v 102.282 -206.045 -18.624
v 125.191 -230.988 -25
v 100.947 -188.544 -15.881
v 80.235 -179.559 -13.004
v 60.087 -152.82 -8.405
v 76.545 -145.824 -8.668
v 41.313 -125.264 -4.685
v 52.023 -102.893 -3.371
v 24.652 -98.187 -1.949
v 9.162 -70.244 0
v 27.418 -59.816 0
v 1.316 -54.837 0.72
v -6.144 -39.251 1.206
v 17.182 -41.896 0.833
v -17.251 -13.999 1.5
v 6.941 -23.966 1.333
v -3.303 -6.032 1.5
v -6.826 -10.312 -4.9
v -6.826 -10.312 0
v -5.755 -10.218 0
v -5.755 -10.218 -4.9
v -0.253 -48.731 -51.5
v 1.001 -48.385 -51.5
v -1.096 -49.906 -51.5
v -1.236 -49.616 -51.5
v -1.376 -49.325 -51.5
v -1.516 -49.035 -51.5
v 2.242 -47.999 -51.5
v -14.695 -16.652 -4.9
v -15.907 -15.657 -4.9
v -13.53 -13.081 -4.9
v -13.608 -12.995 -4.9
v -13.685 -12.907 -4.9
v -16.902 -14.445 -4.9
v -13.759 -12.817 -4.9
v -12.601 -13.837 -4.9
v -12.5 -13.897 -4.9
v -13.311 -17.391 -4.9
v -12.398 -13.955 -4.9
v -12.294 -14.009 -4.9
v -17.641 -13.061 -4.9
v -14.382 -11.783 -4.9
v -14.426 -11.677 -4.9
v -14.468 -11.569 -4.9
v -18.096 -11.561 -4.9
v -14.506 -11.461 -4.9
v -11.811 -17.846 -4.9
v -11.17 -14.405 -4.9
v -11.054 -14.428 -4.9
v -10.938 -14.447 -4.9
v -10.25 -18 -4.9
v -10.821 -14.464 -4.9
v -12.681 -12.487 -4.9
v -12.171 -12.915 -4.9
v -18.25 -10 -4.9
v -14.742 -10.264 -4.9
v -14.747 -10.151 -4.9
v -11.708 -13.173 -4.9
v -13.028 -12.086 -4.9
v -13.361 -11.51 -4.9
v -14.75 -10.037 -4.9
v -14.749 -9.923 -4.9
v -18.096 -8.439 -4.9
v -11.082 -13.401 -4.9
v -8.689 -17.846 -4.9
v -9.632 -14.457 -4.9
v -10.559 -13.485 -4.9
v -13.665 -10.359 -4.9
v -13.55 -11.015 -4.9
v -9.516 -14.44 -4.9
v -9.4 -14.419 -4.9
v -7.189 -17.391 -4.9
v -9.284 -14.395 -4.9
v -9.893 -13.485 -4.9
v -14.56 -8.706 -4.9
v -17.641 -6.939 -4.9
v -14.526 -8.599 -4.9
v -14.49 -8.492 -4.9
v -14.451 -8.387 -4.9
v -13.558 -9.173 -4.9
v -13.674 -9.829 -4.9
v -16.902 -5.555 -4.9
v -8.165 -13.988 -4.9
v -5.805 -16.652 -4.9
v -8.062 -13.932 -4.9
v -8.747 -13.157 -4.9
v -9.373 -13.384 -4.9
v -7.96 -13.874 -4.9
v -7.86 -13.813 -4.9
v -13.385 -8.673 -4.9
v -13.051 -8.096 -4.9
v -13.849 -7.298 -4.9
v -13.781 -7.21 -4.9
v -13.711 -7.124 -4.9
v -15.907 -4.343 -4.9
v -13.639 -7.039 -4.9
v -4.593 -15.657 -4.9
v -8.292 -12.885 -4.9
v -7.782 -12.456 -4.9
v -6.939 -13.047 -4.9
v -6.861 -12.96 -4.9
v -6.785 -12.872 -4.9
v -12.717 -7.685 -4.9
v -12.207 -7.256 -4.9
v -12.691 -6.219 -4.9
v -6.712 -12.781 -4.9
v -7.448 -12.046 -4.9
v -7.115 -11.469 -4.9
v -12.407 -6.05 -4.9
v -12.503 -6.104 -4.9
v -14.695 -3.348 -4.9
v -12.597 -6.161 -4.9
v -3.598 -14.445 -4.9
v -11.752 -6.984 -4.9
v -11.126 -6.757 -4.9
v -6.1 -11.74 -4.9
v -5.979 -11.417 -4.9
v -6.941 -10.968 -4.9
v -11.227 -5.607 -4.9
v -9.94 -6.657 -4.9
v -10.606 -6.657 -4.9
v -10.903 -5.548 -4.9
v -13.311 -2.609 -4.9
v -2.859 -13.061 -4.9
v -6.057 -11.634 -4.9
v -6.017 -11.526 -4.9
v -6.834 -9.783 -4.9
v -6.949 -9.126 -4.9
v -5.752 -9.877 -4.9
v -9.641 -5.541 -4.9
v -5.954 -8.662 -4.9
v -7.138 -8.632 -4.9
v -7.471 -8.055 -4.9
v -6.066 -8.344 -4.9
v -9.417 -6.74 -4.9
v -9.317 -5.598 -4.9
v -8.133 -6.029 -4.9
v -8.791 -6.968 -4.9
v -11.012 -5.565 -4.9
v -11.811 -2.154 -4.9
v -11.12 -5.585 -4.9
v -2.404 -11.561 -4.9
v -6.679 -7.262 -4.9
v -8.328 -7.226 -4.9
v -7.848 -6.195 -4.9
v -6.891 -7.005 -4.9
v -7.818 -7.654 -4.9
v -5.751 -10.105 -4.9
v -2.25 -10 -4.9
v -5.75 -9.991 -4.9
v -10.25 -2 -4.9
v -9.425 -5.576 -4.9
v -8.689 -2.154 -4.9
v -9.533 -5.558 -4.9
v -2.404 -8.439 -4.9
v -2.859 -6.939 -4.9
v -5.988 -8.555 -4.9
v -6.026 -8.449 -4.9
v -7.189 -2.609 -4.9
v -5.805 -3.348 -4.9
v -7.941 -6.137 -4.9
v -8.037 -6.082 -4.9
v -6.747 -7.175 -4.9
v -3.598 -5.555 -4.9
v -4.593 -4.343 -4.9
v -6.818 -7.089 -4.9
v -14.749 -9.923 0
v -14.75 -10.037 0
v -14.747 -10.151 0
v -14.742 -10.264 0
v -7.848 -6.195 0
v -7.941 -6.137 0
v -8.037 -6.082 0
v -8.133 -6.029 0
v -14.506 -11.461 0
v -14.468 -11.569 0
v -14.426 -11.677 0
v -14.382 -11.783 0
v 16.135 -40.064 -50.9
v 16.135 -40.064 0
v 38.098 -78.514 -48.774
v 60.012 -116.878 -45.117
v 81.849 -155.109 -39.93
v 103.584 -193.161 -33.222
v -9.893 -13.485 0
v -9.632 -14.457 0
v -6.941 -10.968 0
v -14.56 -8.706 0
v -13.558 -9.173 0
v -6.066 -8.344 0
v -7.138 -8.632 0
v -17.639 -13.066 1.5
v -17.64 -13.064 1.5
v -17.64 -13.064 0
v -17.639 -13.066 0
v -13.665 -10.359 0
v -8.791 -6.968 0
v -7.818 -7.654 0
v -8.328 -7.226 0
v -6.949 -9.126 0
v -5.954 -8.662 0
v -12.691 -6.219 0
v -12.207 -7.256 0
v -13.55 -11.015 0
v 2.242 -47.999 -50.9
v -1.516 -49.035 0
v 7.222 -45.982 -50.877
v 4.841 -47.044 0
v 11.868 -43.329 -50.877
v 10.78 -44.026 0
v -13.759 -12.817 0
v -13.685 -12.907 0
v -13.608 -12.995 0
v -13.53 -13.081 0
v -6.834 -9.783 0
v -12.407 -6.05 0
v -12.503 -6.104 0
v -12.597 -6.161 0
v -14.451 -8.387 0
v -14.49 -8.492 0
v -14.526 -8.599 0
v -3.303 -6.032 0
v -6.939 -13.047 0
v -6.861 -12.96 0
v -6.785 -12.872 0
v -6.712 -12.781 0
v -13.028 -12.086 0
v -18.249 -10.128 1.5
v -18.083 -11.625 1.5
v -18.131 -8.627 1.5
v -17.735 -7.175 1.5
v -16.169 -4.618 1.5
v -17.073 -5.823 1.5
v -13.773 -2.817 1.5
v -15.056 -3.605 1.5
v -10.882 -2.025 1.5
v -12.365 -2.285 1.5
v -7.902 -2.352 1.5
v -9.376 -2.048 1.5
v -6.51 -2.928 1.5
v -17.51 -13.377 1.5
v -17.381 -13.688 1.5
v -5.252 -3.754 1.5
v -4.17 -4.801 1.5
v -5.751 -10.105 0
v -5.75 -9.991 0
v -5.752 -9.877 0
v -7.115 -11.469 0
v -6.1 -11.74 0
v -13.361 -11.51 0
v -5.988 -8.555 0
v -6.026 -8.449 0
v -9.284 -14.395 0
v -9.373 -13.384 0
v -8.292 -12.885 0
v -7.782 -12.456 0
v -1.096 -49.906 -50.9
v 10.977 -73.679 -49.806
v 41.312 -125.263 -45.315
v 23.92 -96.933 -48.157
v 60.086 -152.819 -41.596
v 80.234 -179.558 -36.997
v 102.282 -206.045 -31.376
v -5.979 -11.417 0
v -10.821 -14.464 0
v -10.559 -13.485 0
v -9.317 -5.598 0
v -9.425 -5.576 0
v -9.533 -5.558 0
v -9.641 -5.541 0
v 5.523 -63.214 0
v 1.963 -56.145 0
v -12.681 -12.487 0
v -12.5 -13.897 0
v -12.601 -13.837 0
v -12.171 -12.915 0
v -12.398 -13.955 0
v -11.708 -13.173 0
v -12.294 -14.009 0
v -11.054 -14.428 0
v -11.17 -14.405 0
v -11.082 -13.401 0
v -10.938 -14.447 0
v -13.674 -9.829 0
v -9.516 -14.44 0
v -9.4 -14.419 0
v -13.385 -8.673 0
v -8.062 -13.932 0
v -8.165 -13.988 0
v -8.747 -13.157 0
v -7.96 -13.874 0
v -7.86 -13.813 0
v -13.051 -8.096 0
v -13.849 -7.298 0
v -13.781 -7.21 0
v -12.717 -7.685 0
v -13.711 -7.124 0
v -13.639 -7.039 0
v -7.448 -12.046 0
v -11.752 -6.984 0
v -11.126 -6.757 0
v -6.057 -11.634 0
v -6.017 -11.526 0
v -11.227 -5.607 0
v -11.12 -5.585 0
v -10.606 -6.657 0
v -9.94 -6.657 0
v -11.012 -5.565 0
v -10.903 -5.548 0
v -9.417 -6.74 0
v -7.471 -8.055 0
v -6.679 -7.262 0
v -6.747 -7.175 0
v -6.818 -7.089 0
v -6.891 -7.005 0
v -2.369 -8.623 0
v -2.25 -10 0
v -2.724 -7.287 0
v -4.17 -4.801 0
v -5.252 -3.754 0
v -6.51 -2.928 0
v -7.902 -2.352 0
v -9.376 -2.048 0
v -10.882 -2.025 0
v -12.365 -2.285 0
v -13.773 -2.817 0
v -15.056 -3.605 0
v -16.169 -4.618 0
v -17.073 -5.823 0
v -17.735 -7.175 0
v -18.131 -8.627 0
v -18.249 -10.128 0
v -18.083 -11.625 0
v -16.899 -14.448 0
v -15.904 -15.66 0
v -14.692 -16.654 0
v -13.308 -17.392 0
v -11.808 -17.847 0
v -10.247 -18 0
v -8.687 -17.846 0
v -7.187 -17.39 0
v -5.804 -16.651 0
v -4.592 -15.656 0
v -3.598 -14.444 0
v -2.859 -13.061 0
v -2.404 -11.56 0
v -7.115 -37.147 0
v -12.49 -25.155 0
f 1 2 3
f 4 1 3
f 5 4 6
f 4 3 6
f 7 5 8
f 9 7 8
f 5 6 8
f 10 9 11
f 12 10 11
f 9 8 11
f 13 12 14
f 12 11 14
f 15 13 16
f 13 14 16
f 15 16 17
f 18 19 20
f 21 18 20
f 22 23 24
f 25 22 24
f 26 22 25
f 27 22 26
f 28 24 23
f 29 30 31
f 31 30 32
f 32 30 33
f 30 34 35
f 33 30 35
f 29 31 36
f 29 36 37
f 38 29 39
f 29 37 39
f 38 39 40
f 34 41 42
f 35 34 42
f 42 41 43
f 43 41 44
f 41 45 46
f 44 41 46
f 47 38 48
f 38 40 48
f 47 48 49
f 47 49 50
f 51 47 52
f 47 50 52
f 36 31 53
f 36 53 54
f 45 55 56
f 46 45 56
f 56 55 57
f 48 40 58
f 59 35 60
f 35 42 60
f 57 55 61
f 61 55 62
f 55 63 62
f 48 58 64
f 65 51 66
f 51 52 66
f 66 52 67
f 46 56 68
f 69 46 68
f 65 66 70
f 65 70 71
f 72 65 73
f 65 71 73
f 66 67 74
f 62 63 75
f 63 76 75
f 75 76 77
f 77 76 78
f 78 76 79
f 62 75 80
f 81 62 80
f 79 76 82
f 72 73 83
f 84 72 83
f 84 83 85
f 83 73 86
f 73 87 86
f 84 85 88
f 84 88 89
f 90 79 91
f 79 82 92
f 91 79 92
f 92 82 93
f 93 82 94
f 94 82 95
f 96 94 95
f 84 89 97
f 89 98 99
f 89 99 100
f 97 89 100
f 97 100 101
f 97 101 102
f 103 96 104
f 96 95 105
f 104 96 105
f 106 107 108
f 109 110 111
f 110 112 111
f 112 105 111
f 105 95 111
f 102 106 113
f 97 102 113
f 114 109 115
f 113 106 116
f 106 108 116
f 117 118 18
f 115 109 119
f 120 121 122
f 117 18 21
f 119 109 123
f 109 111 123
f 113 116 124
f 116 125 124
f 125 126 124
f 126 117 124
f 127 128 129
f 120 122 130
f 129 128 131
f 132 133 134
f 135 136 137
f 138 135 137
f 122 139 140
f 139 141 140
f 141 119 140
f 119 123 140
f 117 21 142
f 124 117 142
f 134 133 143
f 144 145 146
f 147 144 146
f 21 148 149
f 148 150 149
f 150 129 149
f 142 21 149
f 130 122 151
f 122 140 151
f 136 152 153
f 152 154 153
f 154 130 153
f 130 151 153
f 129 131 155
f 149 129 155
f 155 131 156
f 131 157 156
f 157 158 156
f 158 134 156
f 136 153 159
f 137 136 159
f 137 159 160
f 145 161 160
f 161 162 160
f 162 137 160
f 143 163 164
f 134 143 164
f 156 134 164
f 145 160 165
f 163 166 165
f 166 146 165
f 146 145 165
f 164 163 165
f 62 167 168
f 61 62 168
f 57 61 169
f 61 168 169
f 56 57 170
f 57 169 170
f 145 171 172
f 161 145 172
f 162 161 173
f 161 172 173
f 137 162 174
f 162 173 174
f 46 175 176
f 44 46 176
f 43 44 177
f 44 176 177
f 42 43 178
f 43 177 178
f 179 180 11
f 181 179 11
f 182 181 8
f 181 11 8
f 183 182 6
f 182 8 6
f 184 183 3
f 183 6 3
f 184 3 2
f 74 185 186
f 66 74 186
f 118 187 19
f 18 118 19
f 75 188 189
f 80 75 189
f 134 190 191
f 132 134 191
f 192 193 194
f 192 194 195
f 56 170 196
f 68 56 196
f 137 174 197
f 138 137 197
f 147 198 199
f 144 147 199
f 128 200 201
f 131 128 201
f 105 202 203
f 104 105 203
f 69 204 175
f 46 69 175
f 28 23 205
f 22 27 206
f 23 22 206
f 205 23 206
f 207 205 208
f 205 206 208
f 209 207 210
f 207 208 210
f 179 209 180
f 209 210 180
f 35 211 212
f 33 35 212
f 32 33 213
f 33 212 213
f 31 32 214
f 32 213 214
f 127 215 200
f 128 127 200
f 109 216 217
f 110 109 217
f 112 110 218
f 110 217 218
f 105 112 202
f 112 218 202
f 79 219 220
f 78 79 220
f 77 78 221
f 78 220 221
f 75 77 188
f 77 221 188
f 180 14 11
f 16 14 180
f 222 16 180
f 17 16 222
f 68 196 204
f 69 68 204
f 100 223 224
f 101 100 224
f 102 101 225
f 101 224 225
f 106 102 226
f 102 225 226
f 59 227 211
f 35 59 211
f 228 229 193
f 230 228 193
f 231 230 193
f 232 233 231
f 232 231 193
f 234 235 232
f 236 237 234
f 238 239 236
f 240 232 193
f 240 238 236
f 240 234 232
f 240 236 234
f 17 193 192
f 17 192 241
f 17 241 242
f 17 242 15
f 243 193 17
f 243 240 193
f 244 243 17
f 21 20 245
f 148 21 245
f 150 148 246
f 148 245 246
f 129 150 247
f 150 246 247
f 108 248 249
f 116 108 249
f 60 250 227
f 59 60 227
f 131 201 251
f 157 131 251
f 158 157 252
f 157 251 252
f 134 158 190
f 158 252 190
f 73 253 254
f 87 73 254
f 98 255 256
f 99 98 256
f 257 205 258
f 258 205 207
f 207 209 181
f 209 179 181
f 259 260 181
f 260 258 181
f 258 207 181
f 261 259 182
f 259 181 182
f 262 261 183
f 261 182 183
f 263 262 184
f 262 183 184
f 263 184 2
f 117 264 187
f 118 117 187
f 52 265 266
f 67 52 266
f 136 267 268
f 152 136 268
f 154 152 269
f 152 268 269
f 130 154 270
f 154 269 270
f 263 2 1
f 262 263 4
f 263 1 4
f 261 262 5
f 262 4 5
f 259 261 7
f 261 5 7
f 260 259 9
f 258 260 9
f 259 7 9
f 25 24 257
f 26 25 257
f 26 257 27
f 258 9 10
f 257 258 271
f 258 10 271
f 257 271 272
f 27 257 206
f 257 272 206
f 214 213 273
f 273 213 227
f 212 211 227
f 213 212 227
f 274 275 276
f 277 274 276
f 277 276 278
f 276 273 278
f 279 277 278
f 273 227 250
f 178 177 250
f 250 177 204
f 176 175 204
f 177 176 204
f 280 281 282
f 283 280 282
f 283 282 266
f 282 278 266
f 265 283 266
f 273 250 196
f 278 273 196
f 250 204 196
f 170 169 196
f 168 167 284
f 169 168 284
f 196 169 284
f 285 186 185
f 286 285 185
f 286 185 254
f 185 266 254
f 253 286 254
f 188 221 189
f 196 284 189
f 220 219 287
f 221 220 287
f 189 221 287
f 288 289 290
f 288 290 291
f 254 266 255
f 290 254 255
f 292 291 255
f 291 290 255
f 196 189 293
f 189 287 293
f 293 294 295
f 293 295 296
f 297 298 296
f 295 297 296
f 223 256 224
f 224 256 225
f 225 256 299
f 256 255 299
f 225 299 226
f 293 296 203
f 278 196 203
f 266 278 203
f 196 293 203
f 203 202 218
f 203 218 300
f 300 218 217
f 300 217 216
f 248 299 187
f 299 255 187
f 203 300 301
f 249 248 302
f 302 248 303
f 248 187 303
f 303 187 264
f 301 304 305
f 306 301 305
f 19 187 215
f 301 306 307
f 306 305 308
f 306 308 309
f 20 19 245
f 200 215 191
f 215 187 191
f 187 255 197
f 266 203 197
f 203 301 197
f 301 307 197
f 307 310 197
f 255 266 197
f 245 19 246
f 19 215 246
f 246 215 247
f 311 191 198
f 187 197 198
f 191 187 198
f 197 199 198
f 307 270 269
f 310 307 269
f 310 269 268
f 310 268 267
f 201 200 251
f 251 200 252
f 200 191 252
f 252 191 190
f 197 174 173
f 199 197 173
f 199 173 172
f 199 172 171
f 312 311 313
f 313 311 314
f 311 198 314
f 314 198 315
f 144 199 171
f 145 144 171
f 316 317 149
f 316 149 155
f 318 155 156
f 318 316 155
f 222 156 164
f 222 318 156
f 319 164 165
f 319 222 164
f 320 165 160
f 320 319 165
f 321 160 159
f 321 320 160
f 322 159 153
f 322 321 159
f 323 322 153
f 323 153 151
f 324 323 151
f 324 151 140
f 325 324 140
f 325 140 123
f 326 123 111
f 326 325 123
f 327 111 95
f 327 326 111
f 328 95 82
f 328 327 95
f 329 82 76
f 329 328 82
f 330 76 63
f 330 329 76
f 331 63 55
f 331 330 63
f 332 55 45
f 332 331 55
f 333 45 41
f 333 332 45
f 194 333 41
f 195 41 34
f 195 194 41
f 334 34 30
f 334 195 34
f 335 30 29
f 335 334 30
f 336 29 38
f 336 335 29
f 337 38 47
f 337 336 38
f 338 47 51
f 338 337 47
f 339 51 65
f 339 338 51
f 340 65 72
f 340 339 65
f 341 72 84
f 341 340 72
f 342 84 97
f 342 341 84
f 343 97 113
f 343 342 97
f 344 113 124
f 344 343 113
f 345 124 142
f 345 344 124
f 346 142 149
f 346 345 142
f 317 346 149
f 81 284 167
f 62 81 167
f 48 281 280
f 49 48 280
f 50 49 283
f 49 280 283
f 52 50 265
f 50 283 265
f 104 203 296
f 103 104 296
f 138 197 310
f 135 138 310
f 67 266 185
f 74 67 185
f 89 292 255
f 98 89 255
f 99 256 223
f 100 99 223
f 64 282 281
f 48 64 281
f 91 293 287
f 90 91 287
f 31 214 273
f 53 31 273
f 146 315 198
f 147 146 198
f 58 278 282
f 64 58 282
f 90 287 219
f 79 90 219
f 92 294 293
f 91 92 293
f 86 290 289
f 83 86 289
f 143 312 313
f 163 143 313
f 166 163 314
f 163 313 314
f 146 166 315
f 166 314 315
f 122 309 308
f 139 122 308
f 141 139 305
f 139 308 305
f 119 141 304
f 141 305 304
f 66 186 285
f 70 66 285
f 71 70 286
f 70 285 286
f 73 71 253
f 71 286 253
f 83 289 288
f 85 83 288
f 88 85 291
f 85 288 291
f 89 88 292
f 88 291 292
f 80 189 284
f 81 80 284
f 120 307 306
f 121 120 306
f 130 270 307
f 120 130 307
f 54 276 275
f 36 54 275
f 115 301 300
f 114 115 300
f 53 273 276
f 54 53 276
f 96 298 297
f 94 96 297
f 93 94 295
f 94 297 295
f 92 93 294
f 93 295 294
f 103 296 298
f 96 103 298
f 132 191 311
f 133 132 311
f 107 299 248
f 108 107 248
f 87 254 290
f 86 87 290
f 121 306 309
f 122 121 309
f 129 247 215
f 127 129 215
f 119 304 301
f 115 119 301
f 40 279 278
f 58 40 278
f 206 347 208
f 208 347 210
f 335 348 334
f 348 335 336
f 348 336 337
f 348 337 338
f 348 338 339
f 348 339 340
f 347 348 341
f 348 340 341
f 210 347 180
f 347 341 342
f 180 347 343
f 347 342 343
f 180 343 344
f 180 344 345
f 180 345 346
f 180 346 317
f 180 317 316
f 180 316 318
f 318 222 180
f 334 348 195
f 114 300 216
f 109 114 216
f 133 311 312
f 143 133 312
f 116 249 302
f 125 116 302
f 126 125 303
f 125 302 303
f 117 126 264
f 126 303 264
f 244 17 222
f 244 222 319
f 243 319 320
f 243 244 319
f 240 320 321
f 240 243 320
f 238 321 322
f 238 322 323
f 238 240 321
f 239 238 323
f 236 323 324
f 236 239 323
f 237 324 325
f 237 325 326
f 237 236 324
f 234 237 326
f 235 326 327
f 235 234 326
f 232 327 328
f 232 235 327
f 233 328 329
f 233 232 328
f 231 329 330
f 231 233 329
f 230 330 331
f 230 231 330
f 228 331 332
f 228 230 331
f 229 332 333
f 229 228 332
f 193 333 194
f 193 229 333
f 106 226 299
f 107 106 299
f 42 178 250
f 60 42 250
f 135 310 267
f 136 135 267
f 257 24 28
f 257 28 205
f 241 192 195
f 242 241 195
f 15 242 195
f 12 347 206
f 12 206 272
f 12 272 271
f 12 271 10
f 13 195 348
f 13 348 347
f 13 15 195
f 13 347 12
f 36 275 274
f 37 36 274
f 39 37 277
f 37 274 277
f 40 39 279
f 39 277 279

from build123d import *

# Parameters (mm, degrees)
ESQUISSE1_R             = 8
BOSS_EXTRU_1_DEPTH      = 4.9
BOSS_EXTRU_2_START      = 1.5
BOSS_EXTRU_2_DEPTH      = 1.5
BOSS_EXTRU_3_DEPTH      = 51.5
ENL_V_MAT_EXTRU_1_DEPTH = 25


with BuildPart() as part:
    # Esquisse1 → Boss.-Extru.1 (new body)
    with BuildSketch(Plane.XY):
        with Locations((-10.25, -10)):
            Circle(ESQUISSE1_R)
        with BuildLine():
            Line((-5.751675839, -9.877200395), (-6.833750507, -9.782531128))
            Line((-6.833750507, -9.782531128), (-6.949445107, -9.126394451))
            Line((-6.949445107, -9.126394451), (-5.953521963, -8.661987862))
            ThreePointArc((-5.953521963, -8.661987862), (-6.006634107, -8.502052772), (-6.065697468, -8.344218516))
            Line((-6.065697468, -8.344218516), (-7.138261768, -8.631611254))
            Line((-7.138261768, -8.631611254), (-7.47139109, -8.054614344))
            Line((-7.47139109, -8.054614344), (-6.678798898, -7.262022153))
            ThreePointArc((-6.678798898, -7.262022153), (-6.782621037, -7.131675902), (-6.891198054, -7.005263035))
            Line((-6.891198054, -7.005263035), (-7.818046533, -7.654249327))
            Line((-7.818046533, -7.654249327), (-8.328430264, -7.225986526))
            Line((-8.328430264, -7.225986526), (-7.847635402, -6.194918616))
            ThreePointArc((-7.847635402, -6.194918616), (-7.988951343, -6.109285545), (-8.133315872, -6.028898352))
            Line((-8.133315872, -6.028898352), (-8.791112727, -6.968329619))
            Line((-8.791112727, -6.968329619), (-9.417191057, -6.740455742))
            Line((-9.417191057, -6.740455742), (-9.317216173, -5.597737589))
            ThreePointArc((-9.317216173, -5.597737589), (-9.478728542, -5.566588183), (-9.641271425, -5.541362369))
            Line((-9.641271425, -5.541362369), (-9.940094206, -6.656584169))
            Line((-9.940094206, -6.656584169), (-10.606352849, -6.656584169))
            Line((-10.606352849, -6.656584169), (-10.903477232, -5.547700874))
            ThreePointArc((-10.903477232, -5.547700874), (-11.065761738, -5.574558464), (-11.226956242, -5.607329229))
            Line((-11.226956242, -5.607329229), (-11.126406846, -6.756614081))
            Line((-11.126406846, -6.756614081), (-11.752485176, -6.984487958))
            Line((-11.752485176, -6.984487958), (-12.406540122, -6.050400691))
            ThreePointArc((-12.406540122, -6.050400691), (-12.550096477, -6.132241451), (-12.690551241, -6.219297732))
            Line((-12.690551241, -6.219297732), (-12.206963835, -7.256354271))
            Line((-12.206963835, -7.256354271), (-12.717347566, -7.684617071))
            Line((-12.717347566, -7.684617071), (-13.638885709, -7.039349117))
            ThreePointArc((-13.638885709, -7.039349117), (-13.74618945, -7.166864047), (-13.848697947, -7.298264801))
            Line((-13.848697947, -7.298264801), (-13.051434053, -8.095528695))
            Line((-13.051434053, -8.095528695), (-13.384563375, -8.672525605))
            Line((-13.384563375, -8.672525605), (-14.450903238, -8.3868007))
            ThreePointArc((-14.450903238, -8.3868007), (-14.508366703, -8.545244687), (-14.559856563, -8.705729393))
            Line((-14.559856563, -8.705729393), (-13.557961929, -9.172920534))
            Line((-13.557961929, -9.172920534), (-13.673656528, -9.829057211))
            Line((-13.673656528, -9.829057211), (-14.74934404, -9.923167674))
            ThreePointArc((-14.74934404, -9.923167674), (-14.749021481, -10.093838761), (-14.74222728, -10.264374865))
            Line((-14.74222728, -10.264374865), (-13.665452724, -10.358580432))
            Line((-13.665452724, -10.358580432), (-13.549758125, -11.014717109))
            Line((-13.549758125, -11.014717109), (-14.506309194, -11.460764198))
            ThreePointArc((-14.506309194, -11.460764198), (-14.447094307, -11.623083293), (-14.381691786, -11.78300953))
            Line((-14.381691786, -11.78300953), (-13.360941463, -11.509500306))
            Line((-13.360941463, -11.509500306), (-13.027812142, -12.086497216))
            Line((-13.027812142, -12.086497216), (-13.758807936, -12.817493011))
            ThreePointArc((-13.758807936, -12.817493011), (-13.646852578, -12.951506829), (-13.529782028, -13.081076086))
            Line((-13.529782028, -13.081076086), (-12.681156698, -12.486862233))
            Line((-12.681156698, -12.486862233), (-12.170772967, -12.915125033))
            Line((-12.170772967, -12.915125033), (-12.600738895, -13.837189942))
            ThreePointArc((-12.600738895, -13.837189942), (-12.448909121, -13.926168447), (-12.293716433, -14.009142444))
            Line((-12.293716433, -14.009142444), (-11.708090504, -13.172781941))
            Line((-11.708090504, -13.172781941), (-11.082012174, -13.400655818))
            Line((-11.082012174, -13.400655818), (-11.169878896, -14.404977051))
            ThreePointArc((-11.169878896, -14.404977051), (-10.996236031, -14.437694422), (-10.821442589, -14.463569577))
            Line((-10.821442589, -14.463569577), (-10.559109026, -13.48452739))
            Line((-10.559109026, -13.48452739), (-9.892850383, -13.48452739))
            Line((-9.892850383, -13.48452739), (-9.632173683, -14.457386077))
            ThreePointArc((-9.632173683, -14.457386077), (-9.45766281, -14.42969545), (-9.284373537, -14.395175256))
            Line((-9.284373537, -14.395175256), (-9.372796385, -13.384497479))
            Line((-9.372796385, -13.384497479), (-8.746718055, -13.156623602))
            Line((-8.746718055, -13.156623602), (-8.164782025, -13.987714383))
            ThreePointArc((-8.164782025, -13.987714383), (-8.010469052, -13.903139907), (-7.859580663, -13.812596936))
            Line((-7.859580663, -13.812596936), (-8.292239396, -12.884757289))
            Line((-8.292239396, -12.884757289), (-7.781855665, -12.456494489))
            Line((-7.781855665, -12.456494489), (-6.938532496, -13.046995729))
            ThreePointArc((-6.938532496, -13.046995729), (-6.822819391, -12.916236114), (-6.712266113, -12.78108593))
            Line((-6.712266113, -12.78108593), (-7.447769178, -12.045582865))
            Line((-7.447769178, -12.045582865), (-7.114639857, -11.468585954))
            Line((-7.114639857, -11.468585954), (-6.100183444, -11.740408731))
            ThreePointArc((-6.100183444, -11.740408731), (-6.036436962, -11.579837499), (-5.978900904, -11.416937723))
            Line((-5.978900904, -11.416937723), (-6.941241303, -10.968191026))
            Line((-6.941241303, -10.968191026), (-6.825546704, -10.312054348))
            Line((-6.825546704, -10.312054348), (-5.755303948, -10.21842024))
            ThreePointArc((-5.755303948, -10.21842024), (-5.750254354, -10.04784472), (-5.751675839, -9.877200395))
        make_face(mode=Mode.SUBTRACT)
    extrude(amount=-BOSS_EXTRU_1_DEPTH)

    # Esquisse2 → Boss.-Extru.2 (add)
    with BuildSketch(Plane.XY.offset(BOSS_EXTRU_2_START)):
        with BuildLine():
            ThreePointArc((-3.303360096, -6.032104583), (-13.772784459, -2.817382813), (-17.640109889, -13.06370296))
            Line((-17.640109889, -13.06370296), (-17.639263276, -13.065744321))
            ThreePointArc((-17.639263276, -13.065744321), (43.56377057, -128.719994734), (125.190682292, -230.988094713))
            Line((125.190682292, -230.988094713), (-3.303360096, -6.032104583))
        make_face()
    extrude(amount=-BOSS_EXTRU_2_DEPTH)

    # Esquisse3 → Boss.-Extru.3 (add)
    with BuildSketch(Plane(origin=(0, 0, 0), x_dir=(-1, 0, 0), z_dir=(0, 0, -1))):
        with BuildLine():
            Line((-16.135278154, -40.063550967), (-125.190682292, -230.988094713))
            ThreePointArc((-125.190682292, -230.988094713), (-54.599179759, -145.051819269), (1.516379631, -49.034905857))
            ThreePointArc((1.516379631, -49.034905857), (-7.873342973, -45.658721787), (-16.135278154, -40.063550967))
        make_face()
    extrude(amount=BOSS_EXTRU_3_DEPTH)

    # Esquisse4 → Enlèv. mat.-Extru.1 (cut)
    with BuildSketch(Plane(origin=(-5.088632244, -2.906608208, 0), x_dir=(0, 0, -1), z_dir=(0.8683299880241373, 0.4959869271442563, 0))):
        with BuildLine():
            Line((-1.5, -3.599433877), (-1.5, -262.666831333))
            Line((-1.5, -262.666831333), (25, -262.666831333))
            ThreePointArc((25, -262.666831333), (5.142239669, -133.809040305), (-1.5, -3.599433877))
        make_face()
        with BuildLine():
            ThreePointArc((50.899666007, -42.791269762), (42.714152109, -153.29025104), (25, -262.666831333))
            Line((25, -262.666831333), (51.5, -262.666831333))
            Line((51.5, -262.666831333), (51.5, -42.791269762))
            Line((51.5, -42.791269762), (50.899666007, -42.791269762))
        make_face()
    extrude(amount=-ENL_V_MAT_EXTRU_1_DEPTH, mode=Mode.SUBTRACT)


solid = part.part
